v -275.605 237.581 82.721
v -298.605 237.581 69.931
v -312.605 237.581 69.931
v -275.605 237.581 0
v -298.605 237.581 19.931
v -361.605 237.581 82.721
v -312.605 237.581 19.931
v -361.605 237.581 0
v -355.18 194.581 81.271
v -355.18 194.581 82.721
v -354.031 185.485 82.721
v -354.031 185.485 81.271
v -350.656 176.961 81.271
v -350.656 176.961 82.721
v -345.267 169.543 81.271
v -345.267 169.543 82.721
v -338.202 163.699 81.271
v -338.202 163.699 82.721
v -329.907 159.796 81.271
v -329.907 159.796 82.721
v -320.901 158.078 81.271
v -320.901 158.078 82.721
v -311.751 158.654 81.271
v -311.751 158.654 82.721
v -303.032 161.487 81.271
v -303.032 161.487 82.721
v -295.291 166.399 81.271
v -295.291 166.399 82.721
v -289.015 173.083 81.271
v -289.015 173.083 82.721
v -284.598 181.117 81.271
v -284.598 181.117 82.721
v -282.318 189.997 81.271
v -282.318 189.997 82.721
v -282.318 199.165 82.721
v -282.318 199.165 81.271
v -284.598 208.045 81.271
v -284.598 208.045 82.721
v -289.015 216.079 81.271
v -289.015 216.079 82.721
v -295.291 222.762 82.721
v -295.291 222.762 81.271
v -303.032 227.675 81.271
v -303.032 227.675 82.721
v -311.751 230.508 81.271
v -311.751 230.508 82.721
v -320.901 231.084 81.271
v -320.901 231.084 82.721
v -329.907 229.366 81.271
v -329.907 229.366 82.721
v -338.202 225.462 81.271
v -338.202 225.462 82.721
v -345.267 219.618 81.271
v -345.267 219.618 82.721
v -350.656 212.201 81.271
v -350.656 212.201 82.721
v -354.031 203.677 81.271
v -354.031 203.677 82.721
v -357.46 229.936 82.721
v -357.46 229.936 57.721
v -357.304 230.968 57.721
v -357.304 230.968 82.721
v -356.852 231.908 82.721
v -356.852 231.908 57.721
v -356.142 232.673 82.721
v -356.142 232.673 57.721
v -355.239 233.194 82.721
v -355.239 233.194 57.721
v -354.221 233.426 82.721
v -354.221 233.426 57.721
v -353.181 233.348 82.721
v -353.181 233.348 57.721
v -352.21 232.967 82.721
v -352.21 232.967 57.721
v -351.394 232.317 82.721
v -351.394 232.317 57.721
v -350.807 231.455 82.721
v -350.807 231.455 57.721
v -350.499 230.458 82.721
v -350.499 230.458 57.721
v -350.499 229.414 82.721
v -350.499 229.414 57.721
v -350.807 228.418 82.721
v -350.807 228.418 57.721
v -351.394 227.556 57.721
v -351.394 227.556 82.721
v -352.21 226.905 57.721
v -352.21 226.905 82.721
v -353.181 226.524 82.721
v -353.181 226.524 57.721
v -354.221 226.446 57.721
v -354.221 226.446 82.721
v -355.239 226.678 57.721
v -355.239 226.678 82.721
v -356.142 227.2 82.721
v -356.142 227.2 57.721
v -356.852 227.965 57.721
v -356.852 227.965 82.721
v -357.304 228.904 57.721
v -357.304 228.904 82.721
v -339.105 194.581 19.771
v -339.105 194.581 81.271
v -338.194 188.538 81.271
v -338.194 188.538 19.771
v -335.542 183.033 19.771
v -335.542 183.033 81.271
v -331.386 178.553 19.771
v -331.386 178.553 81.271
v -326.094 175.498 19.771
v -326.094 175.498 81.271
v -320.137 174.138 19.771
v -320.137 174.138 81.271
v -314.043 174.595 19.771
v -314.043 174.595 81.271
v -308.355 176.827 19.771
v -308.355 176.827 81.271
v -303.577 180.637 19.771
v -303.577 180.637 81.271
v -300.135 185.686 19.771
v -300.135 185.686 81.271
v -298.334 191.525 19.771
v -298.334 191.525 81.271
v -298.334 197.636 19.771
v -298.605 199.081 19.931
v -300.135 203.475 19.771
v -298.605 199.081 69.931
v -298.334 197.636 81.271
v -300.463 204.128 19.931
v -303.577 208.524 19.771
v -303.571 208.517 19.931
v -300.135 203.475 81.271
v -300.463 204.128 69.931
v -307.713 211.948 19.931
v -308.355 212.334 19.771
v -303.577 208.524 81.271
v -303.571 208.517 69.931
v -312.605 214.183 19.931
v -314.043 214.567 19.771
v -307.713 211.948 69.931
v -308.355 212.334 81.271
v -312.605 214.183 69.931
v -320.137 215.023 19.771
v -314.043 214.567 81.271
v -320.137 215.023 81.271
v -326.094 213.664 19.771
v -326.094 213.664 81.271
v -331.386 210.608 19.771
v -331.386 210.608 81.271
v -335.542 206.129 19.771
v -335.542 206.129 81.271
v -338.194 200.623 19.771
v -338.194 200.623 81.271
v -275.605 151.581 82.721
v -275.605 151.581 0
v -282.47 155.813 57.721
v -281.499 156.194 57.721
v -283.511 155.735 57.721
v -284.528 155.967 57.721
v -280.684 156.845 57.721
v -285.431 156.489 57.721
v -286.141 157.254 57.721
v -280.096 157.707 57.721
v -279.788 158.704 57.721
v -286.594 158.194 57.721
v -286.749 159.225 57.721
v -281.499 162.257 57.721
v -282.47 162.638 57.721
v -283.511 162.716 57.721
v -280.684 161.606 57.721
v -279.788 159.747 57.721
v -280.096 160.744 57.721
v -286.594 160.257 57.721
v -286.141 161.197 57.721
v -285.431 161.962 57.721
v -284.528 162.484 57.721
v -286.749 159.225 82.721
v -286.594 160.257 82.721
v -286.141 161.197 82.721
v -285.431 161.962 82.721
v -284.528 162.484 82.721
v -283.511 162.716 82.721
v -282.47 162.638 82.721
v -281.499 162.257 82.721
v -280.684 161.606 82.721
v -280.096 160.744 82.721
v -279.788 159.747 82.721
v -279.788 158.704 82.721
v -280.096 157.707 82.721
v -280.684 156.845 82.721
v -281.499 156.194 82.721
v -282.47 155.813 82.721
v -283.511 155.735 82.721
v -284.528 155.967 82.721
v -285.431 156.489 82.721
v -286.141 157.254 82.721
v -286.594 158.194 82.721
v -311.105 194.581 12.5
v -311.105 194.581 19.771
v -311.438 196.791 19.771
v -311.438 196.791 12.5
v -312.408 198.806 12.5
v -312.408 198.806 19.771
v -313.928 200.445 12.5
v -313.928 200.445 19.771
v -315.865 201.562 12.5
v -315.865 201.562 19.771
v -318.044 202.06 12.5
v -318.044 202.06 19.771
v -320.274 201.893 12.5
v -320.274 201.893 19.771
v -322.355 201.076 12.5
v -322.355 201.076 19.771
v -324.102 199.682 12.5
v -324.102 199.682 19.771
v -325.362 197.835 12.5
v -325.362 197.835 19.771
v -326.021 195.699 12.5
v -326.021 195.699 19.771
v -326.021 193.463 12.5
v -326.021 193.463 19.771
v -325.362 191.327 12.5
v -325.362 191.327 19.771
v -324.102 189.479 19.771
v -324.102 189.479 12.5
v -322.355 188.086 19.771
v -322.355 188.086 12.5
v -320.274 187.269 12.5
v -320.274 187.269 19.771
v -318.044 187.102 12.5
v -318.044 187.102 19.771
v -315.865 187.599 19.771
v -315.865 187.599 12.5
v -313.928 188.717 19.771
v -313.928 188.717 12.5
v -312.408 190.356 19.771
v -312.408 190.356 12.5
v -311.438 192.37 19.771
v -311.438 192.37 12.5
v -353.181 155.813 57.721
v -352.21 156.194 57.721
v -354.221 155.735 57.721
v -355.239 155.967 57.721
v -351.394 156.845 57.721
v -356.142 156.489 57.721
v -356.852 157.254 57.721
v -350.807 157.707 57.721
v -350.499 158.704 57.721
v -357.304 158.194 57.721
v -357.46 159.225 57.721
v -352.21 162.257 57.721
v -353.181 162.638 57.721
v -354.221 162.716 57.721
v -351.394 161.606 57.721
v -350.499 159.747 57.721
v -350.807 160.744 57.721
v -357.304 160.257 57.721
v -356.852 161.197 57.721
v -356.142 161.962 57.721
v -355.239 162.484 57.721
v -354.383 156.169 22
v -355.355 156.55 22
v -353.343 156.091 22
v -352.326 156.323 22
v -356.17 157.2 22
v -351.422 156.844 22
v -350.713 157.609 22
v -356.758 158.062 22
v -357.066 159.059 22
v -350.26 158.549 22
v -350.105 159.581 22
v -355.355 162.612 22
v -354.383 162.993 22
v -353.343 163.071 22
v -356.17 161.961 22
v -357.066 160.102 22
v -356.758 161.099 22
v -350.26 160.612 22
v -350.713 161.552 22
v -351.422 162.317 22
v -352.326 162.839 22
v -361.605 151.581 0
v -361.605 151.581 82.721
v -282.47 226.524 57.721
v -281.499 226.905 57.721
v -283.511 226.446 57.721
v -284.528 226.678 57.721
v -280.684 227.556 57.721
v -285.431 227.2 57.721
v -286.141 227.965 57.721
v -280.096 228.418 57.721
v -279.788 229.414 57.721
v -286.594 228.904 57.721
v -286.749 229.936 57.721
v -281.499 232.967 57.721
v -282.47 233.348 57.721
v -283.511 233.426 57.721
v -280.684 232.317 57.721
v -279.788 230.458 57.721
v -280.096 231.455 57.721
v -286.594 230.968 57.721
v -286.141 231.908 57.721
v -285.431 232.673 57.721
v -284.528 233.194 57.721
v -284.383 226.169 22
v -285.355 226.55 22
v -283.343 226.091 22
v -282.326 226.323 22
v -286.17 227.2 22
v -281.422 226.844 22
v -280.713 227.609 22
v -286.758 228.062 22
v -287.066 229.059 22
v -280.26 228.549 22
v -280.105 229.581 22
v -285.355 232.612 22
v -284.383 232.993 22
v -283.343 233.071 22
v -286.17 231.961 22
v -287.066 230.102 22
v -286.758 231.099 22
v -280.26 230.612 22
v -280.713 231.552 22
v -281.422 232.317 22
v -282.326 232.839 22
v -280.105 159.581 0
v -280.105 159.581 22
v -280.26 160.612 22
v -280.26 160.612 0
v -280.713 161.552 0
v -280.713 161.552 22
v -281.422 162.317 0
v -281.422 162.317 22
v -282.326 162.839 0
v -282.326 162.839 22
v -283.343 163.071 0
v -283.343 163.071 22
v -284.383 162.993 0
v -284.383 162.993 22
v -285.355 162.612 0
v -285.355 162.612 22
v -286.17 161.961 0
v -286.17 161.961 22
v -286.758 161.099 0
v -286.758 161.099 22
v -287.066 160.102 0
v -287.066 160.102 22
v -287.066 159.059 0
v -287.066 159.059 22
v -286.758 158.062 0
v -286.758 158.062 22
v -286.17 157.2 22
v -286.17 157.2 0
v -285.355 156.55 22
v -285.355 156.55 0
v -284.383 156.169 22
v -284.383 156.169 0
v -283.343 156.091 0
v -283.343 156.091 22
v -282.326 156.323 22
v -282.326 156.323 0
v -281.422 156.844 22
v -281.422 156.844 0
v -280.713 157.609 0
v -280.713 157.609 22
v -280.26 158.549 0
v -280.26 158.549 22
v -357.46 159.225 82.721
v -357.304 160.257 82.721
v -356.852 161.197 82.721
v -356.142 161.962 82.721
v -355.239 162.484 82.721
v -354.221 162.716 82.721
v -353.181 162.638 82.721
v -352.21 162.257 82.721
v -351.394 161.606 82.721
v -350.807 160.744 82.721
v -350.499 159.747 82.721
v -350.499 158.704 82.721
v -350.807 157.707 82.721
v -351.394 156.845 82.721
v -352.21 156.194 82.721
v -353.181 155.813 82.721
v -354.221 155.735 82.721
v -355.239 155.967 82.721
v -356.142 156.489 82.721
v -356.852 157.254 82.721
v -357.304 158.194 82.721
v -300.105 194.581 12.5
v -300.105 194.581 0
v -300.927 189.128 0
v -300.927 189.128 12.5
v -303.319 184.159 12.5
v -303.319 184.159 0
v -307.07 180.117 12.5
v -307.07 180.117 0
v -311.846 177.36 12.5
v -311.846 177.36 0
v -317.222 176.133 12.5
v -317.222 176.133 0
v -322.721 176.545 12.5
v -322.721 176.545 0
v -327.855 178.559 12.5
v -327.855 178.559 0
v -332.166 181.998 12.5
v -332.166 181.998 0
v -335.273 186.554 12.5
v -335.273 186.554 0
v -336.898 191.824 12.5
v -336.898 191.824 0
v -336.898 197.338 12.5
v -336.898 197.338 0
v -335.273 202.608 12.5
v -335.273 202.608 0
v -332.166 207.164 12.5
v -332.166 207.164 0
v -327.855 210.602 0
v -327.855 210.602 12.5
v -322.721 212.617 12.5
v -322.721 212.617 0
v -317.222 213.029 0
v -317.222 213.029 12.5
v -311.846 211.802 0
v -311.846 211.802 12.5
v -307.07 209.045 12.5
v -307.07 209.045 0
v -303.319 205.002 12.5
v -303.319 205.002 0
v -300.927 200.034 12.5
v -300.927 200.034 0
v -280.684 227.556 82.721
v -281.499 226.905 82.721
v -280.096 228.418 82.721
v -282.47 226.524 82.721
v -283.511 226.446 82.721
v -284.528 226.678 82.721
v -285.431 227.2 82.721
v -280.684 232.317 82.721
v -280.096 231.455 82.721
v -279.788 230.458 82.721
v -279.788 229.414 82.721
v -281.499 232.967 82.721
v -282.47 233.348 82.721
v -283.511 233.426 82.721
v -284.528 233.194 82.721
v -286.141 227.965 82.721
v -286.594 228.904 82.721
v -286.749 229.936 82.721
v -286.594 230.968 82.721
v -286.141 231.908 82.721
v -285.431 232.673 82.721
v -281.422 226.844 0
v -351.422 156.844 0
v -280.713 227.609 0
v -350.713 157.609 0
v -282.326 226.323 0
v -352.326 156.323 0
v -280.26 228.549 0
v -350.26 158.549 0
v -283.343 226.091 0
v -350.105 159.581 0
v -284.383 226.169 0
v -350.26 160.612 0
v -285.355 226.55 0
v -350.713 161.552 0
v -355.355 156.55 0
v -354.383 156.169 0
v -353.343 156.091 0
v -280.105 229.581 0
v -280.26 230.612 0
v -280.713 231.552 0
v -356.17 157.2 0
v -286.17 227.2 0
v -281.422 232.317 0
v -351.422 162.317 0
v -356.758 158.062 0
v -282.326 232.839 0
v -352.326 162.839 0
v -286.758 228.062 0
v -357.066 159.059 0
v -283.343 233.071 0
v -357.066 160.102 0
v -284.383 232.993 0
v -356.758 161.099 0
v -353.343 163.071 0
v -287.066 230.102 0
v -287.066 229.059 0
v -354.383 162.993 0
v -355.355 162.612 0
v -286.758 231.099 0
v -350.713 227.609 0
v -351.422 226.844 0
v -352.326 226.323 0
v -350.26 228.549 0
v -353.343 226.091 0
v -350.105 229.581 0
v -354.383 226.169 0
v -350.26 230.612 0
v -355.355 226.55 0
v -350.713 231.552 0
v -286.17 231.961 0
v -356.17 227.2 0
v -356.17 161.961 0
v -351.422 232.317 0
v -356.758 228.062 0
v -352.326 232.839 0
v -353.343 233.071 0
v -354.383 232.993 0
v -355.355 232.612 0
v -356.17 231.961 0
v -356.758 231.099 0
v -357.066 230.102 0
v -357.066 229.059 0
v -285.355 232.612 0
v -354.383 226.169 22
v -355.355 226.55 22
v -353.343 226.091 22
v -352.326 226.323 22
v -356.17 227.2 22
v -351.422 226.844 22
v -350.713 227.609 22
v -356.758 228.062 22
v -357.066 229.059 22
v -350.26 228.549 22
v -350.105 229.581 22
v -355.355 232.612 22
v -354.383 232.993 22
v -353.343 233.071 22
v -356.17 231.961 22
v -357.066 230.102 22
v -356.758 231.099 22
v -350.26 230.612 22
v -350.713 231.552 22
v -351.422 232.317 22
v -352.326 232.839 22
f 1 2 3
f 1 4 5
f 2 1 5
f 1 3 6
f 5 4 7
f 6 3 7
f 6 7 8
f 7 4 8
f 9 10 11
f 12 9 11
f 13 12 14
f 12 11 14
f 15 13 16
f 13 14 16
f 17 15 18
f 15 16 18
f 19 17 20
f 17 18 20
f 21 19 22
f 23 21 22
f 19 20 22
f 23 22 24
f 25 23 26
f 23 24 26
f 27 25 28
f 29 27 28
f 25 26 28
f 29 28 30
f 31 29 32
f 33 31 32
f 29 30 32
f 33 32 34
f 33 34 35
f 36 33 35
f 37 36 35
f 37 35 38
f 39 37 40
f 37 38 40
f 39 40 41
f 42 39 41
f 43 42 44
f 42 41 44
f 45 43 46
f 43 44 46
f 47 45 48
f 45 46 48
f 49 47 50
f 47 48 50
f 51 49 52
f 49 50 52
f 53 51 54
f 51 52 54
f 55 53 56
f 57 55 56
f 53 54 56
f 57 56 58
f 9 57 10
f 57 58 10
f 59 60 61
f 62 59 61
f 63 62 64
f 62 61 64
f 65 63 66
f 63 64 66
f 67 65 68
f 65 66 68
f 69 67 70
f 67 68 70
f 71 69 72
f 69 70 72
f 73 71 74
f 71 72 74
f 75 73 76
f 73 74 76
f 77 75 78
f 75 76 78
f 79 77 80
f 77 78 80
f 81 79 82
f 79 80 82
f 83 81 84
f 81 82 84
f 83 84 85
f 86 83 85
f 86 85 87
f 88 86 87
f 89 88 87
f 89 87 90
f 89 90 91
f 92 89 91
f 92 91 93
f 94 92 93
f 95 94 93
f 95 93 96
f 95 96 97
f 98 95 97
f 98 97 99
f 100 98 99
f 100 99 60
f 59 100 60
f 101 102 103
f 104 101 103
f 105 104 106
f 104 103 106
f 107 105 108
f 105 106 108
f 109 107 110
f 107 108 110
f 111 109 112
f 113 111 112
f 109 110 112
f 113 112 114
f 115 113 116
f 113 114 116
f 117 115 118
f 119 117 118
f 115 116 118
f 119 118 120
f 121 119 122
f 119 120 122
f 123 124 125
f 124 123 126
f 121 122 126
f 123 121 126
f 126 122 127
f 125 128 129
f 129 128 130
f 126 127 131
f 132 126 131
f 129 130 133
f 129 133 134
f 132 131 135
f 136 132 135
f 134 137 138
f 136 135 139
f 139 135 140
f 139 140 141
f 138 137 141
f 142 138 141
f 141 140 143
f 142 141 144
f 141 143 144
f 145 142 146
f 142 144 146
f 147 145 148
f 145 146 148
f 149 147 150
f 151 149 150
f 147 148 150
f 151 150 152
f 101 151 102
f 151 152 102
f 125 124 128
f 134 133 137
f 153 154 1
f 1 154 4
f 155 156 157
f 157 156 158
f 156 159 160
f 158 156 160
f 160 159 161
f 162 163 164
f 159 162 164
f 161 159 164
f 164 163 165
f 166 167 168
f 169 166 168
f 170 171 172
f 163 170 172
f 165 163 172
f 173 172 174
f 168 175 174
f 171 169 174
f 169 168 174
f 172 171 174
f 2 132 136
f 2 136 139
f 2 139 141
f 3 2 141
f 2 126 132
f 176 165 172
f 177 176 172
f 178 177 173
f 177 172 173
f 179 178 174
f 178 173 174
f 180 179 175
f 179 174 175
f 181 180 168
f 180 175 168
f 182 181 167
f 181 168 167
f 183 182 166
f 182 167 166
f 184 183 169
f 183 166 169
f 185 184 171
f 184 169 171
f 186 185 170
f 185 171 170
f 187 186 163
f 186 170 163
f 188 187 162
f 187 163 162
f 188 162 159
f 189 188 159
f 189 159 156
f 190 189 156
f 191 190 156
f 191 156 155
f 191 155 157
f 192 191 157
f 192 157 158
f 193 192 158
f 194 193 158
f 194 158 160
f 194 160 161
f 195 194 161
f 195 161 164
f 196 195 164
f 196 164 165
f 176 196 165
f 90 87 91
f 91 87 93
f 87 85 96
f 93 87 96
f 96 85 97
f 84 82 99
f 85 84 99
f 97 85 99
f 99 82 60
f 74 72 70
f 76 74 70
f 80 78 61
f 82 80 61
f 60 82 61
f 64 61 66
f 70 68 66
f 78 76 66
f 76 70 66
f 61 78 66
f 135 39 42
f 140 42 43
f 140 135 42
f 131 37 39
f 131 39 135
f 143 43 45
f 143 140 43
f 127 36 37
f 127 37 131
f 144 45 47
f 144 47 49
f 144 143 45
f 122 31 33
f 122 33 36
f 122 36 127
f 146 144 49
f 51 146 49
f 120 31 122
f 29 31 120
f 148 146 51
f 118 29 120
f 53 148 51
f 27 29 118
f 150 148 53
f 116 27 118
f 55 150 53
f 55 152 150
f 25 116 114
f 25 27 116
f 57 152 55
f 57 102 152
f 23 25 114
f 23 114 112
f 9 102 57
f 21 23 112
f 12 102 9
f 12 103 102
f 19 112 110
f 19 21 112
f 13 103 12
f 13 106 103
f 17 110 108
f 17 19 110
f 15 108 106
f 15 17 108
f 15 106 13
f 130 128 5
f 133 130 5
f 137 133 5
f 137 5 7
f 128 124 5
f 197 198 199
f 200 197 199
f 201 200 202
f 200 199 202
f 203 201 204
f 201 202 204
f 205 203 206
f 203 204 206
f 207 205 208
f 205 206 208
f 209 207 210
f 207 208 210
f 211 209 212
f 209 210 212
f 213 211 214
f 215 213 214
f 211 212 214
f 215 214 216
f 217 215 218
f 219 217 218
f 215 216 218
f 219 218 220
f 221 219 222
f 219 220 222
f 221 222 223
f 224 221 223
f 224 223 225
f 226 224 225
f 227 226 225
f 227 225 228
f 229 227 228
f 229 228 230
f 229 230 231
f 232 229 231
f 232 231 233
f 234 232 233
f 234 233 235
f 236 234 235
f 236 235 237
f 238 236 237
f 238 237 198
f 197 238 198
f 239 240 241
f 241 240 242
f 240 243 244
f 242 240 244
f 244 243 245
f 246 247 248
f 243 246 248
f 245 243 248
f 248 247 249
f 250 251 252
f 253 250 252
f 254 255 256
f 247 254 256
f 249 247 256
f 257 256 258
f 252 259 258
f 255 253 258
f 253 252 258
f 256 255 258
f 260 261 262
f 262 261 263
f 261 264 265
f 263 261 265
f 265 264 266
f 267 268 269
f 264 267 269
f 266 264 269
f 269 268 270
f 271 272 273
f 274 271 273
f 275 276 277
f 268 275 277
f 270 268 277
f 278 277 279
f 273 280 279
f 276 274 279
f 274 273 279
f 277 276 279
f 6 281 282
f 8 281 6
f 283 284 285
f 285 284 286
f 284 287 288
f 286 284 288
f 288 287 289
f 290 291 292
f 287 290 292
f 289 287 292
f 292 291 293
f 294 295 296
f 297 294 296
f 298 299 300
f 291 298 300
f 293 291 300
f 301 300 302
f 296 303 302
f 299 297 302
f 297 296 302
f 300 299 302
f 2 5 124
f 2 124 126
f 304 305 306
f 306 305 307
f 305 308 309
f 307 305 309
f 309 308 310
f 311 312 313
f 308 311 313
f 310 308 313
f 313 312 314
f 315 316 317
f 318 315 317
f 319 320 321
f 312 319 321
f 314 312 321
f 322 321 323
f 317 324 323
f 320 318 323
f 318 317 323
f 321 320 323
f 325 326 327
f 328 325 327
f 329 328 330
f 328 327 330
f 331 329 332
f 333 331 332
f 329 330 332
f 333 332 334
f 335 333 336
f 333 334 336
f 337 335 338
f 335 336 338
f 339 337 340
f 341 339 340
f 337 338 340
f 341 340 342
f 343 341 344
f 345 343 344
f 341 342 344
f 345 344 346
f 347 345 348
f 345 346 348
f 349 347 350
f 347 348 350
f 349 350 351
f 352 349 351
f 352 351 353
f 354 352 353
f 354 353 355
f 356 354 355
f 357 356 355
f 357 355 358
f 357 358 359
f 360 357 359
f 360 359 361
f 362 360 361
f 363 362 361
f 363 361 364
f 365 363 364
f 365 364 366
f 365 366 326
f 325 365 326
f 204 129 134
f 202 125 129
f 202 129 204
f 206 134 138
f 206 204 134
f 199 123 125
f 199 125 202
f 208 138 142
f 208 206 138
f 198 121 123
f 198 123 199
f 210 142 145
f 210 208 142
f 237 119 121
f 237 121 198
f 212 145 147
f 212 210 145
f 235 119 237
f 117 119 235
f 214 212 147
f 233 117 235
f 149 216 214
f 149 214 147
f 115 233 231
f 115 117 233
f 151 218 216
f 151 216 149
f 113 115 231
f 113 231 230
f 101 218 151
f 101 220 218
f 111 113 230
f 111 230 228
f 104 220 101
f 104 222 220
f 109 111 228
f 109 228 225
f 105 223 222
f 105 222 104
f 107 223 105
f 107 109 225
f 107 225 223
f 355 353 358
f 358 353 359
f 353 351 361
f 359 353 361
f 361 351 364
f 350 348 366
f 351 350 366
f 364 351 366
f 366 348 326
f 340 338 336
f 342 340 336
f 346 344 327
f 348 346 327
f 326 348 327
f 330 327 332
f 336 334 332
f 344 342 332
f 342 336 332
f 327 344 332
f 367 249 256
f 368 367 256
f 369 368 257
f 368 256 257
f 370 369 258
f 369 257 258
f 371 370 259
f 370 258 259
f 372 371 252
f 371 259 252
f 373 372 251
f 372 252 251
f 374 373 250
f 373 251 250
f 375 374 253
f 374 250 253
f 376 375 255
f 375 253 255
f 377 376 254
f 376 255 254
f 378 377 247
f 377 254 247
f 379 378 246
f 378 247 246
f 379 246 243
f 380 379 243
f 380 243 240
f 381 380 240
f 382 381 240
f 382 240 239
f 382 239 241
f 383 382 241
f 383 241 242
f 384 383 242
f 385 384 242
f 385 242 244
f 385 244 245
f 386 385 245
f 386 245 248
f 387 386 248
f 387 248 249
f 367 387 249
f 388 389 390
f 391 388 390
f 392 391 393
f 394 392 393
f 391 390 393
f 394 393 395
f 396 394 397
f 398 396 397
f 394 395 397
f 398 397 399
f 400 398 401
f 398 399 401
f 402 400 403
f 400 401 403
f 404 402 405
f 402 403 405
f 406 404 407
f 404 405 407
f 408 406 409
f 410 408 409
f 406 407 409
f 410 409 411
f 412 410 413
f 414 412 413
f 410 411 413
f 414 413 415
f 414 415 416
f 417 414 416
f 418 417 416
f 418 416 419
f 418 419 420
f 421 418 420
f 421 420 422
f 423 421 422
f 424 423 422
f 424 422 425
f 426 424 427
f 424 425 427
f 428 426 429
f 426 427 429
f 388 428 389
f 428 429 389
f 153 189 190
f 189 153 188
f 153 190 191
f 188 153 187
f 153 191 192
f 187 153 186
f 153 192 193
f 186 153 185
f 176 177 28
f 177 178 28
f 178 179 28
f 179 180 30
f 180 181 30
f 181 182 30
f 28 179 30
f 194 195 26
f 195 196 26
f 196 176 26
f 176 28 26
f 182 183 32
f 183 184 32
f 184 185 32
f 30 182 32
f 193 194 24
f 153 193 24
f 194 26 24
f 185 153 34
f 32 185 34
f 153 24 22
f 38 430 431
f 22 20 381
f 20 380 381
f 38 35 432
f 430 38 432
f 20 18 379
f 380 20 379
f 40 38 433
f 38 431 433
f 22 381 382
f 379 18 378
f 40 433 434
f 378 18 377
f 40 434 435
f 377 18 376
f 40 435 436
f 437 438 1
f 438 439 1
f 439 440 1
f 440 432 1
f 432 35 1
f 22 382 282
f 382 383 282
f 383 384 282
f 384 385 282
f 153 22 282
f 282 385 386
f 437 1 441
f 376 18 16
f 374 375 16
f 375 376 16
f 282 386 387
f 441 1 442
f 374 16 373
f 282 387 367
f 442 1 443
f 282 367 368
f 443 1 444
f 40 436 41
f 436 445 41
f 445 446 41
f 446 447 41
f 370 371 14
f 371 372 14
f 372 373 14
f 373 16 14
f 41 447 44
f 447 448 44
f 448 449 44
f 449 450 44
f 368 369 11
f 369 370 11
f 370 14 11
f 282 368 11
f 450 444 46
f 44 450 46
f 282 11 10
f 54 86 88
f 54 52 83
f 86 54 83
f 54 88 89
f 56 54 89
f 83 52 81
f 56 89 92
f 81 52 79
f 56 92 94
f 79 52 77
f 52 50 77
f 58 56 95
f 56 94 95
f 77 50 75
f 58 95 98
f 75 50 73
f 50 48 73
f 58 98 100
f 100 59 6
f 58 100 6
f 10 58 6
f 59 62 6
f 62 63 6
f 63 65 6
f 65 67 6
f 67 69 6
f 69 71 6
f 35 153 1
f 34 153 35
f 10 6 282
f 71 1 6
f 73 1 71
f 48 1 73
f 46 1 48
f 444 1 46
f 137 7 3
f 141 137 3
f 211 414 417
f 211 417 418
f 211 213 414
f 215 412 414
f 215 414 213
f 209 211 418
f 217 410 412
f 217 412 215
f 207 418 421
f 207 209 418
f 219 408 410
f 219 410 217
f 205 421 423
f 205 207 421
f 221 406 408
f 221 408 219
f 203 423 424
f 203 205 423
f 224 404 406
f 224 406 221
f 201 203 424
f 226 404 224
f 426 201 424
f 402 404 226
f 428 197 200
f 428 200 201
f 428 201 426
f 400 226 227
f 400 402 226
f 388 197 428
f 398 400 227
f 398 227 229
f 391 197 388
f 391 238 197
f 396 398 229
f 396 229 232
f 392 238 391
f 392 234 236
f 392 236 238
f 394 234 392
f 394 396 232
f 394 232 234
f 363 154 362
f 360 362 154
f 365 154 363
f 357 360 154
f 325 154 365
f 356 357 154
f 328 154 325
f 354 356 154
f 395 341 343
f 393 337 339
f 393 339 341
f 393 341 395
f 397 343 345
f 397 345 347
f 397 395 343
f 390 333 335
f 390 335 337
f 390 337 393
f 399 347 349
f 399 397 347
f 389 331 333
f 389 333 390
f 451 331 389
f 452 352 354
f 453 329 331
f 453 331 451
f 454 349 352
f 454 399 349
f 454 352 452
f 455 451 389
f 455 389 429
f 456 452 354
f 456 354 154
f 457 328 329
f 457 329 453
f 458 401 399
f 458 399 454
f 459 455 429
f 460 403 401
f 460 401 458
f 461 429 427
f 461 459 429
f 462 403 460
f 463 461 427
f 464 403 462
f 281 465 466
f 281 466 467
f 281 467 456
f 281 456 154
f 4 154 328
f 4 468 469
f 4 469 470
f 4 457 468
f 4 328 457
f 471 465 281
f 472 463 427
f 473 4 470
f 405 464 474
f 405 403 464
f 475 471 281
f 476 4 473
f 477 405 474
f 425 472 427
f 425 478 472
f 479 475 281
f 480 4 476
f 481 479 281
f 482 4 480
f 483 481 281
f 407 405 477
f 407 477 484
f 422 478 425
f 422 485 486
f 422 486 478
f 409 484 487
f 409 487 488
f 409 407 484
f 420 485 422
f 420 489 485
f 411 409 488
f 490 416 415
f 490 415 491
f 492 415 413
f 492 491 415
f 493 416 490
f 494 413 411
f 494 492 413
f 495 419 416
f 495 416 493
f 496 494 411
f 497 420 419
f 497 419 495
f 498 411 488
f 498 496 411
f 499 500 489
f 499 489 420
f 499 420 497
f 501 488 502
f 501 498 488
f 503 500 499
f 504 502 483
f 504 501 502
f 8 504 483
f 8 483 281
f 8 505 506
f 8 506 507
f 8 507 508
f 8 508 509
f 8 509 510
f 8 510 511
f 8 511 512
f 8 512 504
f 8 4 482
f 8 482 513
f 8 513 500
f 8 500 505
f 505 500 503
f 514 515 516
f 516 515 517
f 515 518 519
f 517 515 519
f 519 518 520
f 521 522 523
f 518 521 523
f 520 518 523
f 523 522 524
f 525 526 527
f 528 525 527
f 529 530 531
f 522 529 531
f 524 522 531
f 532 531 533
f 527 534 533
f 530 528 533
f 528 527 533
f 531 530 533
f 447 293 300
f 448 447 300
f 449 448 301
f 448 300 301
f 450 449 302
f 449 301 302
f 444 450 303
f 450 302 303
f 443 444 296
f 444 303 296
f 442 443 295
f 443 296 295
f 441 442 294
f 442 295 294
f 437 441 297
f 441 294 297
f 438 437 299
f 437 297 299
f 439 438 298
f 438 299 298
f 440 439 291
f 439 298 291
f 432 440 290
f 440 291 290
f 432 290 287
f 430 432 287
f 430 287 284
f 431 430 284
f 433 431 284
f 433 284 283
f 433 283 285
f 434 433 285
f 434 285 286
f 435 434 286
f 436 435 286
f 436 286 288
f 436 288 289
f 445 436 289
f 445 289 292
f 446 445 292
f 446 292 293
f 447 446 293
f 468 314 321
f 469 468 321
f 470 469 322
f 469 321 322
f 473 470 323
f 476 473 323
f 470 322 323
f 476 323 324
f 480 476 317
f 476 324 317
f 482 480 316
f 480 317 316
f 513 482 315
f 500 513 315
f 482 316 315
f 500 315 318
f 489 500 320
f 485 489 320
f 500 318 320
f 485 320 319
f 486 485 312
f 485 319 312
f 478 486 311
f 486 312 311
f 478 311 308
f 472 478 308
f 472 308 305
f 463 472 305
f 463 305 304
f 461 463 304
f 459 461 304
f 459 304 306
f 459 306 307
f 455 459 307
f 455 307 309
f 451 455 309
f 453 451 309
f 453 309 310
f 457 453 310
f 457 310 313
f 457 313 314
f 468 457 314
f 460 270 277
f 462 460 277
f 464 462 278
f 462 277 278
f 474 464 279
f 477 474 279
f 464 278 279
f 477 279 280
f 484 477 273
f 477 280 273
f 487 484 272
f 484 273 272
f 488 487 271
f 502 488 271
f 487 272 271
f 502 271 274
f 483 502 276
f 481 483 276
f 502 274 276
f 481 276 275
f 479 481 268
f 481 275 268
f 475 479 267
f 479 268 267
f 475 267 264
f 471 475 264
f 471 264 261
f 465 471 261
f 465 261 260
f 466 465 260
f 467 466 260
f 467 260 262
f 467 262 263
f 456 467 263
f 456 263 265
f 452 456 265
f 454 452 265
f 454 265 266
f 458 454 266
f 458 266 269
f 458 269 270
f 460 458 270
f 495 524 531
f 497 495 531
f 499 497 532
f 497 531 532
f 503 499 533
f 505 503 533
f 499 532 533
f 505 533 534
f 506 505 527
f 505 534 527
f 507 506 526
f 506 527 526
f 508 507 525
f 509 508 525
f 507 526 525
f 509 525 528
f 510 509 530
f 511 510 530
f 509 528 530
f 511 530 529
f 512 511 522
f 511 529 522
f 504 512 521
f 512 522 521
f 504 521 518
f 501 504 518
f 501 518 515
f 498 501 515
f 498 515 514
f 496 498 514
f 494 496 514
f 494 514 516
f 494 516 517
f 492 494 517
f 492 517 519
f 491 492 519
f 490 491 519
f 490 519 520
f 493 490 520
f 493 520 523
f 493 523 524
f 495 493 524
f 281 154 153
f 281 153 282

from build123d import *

# Parameters (mm, degrees)
SKETCH1_W                    = 86
SKETCH1_H                    = 86
BOSS_EXTRUDE1_DEPTH          = 82.721
SKETCH2_R                    = 36.575
CUT_EXTRUDE1_DEPTH           = 1.449994037
SKETCH3_R                    = 20.5
CUT_EXTRUDE2_DEPTH           = 61.5
SKETCH4_R                    = 18.5
CUT_EXTRUDE3_DEPTH           = 12.5
SKETCH5_R                    = 7.5
CUT_EXTRUDE4_DEPTH           = 438.22445056
CUT_EXTRUDE5_REACH           = 382.784
CUT_EXTRUDE5_END_RADIUS      = 20.5
SKETCH6_W                    = 14
SKETCH6_H                    = 50
F_7_0_7_DIAMETER_HOLE1_D     = 7
F_7_0_7_DIAMETER_HOLE1_DEPTH = 22
F_7_0_7_DIAMETER_HOLE2_D     = 7
F_7_0_7_DIAMETER_HOLE2_DEPTH = 25.000212861


with BuildPart() as part:
    # Sketch1 → Boss-Extrude1 (new body)
    with BuildSketch(Plane(origin=(0, 0, 0), x_dir=(-1, 0, 0), z_dir=(0, 0, -1))):
        with Locations((318.604600328, 194.58078929)):
            Rectangle(SKETCH1_W, SKETCH1_H)
    extrude(amount=-BOSS_EXTRUDE1_DEPTH)

    # Sketch2 → Cut-Extrude1 (cut)
    with BuildSketch(Plane.XY.offset(82.721)):
        with Locations(Location((-318.604600328, 194.58078929, 0), (0, 0, 180))):
            Circle(SKETCH2_R)
    extrude(amount=-CUT_EXTRUDE1_DEPTH, mode=Mode.SUBTRACT)

    # Sketch3 → Cut-Extrude2 (cut)
    with BuildSketch(Plane.XY.offset(81.271005963)):
        with Locations(Location((-318.604600328, 194.58078929, 0), (0, 0, 180))):
            Circle(SKETCH3_R)
    extrude(amount=-CUT_EXTRUDE2_DEPTH, mode=Mode.SUBTRACT)

    # Sketch4 → Cut-Extrude3 (cut)
    with BuildSketch(Plane(origin=(0, 0, 0), x_dir=(-1, 0, 0), z_dir=(0, 0, -1))):
        with Locations(Location((318.604600328, 194.58078929, 0), (0, 0, 180))):
            Circle(SKETCH4_R)
    extrude(amount=-CUT_EXTRUDE3_DEPTH, mode=Mode.SUBTRACT)

    # Sketch5 → Cut-Extrude4 (cut, through all)
    with BuildSketch(Plane.XY.offset(19.771005963)):
        with Locations((-318.604600328, 194.58078929)):
            Circle(SKETCH5_R)
    extrude(amount=-CUT_EXTRUDE4_DEPTH, mode=Mode.SUBTRACT)

    # Cut-Extrude5: up to this cylinder (the profile starts outside it)
    cut_extrude5_end = Plane(origin=(-318.604600328, 194.58078929, 44.930798), z_dir=(0, 0, 1)) * Cylinder(CUT_EXTRUDE5_END_RADIUS, 807.568, mode=Mode.PRIVATE)
    # Sketch6 → Cut-Extrude5 (cut, up to the surface)
    with BuildSketch(Plane(origin=(0, 237.58078929, 0), x_dir=(-1, 0, 0), z_dir=(0, 1, 0)), mode=Mode.PRIVATE) as cut_extrude5_sk1:
        with Locations((305.604600328, 44.930797937)):
            Rectangle(SKETCH6_W, SKETCH6_H)
    cut_extrude5_tool1 = extrude(cut_extrude5_sk1.sketch, amount=-CUT_EXTRUDE5_REACH, mode=Mode.PRIVATE) - cut_extrude5_end
    add(cut_extrude5_tool1.solids().sort_by_distance((-305.6046, 237.580789, 44.930798))[0], mode=Mode.SUBTRACT)

    # Ø7.0 (7) Diameter Hole1
    with Locations(Plane(origin=(0, 0, 0), x_dir=(-1, 0, 0), z_dir=(0, 0, -1))):
        with Locations((283.604600328, 159.58078929), (283.604600328, 229.58078929), (353.604600328, 159.58078929), (353.604600328, 229.58078929)):
            Hole(F_7_0_7_DIAMETER_HOLE1_D / 2, depth=F_7_0_7_DIAMETER_HOLE1_DEPTH)

    # Ø7.0 (7) Diameter Hole2
    with Locations(Plane.XY.offset(82.721)):
        with Locations((-283.249261269, 159.22545023), (-353.959939388, 229.936128349), (-283.249261269, 229.936128349), (-353.959939388, 159.22545023)):
            Hole(F_7_0_7_DIAMETER_HOLE2_D / 2, depth=F_7_0_7_DIAMETER_HOLE2_DEPTH)


solid = part.part
